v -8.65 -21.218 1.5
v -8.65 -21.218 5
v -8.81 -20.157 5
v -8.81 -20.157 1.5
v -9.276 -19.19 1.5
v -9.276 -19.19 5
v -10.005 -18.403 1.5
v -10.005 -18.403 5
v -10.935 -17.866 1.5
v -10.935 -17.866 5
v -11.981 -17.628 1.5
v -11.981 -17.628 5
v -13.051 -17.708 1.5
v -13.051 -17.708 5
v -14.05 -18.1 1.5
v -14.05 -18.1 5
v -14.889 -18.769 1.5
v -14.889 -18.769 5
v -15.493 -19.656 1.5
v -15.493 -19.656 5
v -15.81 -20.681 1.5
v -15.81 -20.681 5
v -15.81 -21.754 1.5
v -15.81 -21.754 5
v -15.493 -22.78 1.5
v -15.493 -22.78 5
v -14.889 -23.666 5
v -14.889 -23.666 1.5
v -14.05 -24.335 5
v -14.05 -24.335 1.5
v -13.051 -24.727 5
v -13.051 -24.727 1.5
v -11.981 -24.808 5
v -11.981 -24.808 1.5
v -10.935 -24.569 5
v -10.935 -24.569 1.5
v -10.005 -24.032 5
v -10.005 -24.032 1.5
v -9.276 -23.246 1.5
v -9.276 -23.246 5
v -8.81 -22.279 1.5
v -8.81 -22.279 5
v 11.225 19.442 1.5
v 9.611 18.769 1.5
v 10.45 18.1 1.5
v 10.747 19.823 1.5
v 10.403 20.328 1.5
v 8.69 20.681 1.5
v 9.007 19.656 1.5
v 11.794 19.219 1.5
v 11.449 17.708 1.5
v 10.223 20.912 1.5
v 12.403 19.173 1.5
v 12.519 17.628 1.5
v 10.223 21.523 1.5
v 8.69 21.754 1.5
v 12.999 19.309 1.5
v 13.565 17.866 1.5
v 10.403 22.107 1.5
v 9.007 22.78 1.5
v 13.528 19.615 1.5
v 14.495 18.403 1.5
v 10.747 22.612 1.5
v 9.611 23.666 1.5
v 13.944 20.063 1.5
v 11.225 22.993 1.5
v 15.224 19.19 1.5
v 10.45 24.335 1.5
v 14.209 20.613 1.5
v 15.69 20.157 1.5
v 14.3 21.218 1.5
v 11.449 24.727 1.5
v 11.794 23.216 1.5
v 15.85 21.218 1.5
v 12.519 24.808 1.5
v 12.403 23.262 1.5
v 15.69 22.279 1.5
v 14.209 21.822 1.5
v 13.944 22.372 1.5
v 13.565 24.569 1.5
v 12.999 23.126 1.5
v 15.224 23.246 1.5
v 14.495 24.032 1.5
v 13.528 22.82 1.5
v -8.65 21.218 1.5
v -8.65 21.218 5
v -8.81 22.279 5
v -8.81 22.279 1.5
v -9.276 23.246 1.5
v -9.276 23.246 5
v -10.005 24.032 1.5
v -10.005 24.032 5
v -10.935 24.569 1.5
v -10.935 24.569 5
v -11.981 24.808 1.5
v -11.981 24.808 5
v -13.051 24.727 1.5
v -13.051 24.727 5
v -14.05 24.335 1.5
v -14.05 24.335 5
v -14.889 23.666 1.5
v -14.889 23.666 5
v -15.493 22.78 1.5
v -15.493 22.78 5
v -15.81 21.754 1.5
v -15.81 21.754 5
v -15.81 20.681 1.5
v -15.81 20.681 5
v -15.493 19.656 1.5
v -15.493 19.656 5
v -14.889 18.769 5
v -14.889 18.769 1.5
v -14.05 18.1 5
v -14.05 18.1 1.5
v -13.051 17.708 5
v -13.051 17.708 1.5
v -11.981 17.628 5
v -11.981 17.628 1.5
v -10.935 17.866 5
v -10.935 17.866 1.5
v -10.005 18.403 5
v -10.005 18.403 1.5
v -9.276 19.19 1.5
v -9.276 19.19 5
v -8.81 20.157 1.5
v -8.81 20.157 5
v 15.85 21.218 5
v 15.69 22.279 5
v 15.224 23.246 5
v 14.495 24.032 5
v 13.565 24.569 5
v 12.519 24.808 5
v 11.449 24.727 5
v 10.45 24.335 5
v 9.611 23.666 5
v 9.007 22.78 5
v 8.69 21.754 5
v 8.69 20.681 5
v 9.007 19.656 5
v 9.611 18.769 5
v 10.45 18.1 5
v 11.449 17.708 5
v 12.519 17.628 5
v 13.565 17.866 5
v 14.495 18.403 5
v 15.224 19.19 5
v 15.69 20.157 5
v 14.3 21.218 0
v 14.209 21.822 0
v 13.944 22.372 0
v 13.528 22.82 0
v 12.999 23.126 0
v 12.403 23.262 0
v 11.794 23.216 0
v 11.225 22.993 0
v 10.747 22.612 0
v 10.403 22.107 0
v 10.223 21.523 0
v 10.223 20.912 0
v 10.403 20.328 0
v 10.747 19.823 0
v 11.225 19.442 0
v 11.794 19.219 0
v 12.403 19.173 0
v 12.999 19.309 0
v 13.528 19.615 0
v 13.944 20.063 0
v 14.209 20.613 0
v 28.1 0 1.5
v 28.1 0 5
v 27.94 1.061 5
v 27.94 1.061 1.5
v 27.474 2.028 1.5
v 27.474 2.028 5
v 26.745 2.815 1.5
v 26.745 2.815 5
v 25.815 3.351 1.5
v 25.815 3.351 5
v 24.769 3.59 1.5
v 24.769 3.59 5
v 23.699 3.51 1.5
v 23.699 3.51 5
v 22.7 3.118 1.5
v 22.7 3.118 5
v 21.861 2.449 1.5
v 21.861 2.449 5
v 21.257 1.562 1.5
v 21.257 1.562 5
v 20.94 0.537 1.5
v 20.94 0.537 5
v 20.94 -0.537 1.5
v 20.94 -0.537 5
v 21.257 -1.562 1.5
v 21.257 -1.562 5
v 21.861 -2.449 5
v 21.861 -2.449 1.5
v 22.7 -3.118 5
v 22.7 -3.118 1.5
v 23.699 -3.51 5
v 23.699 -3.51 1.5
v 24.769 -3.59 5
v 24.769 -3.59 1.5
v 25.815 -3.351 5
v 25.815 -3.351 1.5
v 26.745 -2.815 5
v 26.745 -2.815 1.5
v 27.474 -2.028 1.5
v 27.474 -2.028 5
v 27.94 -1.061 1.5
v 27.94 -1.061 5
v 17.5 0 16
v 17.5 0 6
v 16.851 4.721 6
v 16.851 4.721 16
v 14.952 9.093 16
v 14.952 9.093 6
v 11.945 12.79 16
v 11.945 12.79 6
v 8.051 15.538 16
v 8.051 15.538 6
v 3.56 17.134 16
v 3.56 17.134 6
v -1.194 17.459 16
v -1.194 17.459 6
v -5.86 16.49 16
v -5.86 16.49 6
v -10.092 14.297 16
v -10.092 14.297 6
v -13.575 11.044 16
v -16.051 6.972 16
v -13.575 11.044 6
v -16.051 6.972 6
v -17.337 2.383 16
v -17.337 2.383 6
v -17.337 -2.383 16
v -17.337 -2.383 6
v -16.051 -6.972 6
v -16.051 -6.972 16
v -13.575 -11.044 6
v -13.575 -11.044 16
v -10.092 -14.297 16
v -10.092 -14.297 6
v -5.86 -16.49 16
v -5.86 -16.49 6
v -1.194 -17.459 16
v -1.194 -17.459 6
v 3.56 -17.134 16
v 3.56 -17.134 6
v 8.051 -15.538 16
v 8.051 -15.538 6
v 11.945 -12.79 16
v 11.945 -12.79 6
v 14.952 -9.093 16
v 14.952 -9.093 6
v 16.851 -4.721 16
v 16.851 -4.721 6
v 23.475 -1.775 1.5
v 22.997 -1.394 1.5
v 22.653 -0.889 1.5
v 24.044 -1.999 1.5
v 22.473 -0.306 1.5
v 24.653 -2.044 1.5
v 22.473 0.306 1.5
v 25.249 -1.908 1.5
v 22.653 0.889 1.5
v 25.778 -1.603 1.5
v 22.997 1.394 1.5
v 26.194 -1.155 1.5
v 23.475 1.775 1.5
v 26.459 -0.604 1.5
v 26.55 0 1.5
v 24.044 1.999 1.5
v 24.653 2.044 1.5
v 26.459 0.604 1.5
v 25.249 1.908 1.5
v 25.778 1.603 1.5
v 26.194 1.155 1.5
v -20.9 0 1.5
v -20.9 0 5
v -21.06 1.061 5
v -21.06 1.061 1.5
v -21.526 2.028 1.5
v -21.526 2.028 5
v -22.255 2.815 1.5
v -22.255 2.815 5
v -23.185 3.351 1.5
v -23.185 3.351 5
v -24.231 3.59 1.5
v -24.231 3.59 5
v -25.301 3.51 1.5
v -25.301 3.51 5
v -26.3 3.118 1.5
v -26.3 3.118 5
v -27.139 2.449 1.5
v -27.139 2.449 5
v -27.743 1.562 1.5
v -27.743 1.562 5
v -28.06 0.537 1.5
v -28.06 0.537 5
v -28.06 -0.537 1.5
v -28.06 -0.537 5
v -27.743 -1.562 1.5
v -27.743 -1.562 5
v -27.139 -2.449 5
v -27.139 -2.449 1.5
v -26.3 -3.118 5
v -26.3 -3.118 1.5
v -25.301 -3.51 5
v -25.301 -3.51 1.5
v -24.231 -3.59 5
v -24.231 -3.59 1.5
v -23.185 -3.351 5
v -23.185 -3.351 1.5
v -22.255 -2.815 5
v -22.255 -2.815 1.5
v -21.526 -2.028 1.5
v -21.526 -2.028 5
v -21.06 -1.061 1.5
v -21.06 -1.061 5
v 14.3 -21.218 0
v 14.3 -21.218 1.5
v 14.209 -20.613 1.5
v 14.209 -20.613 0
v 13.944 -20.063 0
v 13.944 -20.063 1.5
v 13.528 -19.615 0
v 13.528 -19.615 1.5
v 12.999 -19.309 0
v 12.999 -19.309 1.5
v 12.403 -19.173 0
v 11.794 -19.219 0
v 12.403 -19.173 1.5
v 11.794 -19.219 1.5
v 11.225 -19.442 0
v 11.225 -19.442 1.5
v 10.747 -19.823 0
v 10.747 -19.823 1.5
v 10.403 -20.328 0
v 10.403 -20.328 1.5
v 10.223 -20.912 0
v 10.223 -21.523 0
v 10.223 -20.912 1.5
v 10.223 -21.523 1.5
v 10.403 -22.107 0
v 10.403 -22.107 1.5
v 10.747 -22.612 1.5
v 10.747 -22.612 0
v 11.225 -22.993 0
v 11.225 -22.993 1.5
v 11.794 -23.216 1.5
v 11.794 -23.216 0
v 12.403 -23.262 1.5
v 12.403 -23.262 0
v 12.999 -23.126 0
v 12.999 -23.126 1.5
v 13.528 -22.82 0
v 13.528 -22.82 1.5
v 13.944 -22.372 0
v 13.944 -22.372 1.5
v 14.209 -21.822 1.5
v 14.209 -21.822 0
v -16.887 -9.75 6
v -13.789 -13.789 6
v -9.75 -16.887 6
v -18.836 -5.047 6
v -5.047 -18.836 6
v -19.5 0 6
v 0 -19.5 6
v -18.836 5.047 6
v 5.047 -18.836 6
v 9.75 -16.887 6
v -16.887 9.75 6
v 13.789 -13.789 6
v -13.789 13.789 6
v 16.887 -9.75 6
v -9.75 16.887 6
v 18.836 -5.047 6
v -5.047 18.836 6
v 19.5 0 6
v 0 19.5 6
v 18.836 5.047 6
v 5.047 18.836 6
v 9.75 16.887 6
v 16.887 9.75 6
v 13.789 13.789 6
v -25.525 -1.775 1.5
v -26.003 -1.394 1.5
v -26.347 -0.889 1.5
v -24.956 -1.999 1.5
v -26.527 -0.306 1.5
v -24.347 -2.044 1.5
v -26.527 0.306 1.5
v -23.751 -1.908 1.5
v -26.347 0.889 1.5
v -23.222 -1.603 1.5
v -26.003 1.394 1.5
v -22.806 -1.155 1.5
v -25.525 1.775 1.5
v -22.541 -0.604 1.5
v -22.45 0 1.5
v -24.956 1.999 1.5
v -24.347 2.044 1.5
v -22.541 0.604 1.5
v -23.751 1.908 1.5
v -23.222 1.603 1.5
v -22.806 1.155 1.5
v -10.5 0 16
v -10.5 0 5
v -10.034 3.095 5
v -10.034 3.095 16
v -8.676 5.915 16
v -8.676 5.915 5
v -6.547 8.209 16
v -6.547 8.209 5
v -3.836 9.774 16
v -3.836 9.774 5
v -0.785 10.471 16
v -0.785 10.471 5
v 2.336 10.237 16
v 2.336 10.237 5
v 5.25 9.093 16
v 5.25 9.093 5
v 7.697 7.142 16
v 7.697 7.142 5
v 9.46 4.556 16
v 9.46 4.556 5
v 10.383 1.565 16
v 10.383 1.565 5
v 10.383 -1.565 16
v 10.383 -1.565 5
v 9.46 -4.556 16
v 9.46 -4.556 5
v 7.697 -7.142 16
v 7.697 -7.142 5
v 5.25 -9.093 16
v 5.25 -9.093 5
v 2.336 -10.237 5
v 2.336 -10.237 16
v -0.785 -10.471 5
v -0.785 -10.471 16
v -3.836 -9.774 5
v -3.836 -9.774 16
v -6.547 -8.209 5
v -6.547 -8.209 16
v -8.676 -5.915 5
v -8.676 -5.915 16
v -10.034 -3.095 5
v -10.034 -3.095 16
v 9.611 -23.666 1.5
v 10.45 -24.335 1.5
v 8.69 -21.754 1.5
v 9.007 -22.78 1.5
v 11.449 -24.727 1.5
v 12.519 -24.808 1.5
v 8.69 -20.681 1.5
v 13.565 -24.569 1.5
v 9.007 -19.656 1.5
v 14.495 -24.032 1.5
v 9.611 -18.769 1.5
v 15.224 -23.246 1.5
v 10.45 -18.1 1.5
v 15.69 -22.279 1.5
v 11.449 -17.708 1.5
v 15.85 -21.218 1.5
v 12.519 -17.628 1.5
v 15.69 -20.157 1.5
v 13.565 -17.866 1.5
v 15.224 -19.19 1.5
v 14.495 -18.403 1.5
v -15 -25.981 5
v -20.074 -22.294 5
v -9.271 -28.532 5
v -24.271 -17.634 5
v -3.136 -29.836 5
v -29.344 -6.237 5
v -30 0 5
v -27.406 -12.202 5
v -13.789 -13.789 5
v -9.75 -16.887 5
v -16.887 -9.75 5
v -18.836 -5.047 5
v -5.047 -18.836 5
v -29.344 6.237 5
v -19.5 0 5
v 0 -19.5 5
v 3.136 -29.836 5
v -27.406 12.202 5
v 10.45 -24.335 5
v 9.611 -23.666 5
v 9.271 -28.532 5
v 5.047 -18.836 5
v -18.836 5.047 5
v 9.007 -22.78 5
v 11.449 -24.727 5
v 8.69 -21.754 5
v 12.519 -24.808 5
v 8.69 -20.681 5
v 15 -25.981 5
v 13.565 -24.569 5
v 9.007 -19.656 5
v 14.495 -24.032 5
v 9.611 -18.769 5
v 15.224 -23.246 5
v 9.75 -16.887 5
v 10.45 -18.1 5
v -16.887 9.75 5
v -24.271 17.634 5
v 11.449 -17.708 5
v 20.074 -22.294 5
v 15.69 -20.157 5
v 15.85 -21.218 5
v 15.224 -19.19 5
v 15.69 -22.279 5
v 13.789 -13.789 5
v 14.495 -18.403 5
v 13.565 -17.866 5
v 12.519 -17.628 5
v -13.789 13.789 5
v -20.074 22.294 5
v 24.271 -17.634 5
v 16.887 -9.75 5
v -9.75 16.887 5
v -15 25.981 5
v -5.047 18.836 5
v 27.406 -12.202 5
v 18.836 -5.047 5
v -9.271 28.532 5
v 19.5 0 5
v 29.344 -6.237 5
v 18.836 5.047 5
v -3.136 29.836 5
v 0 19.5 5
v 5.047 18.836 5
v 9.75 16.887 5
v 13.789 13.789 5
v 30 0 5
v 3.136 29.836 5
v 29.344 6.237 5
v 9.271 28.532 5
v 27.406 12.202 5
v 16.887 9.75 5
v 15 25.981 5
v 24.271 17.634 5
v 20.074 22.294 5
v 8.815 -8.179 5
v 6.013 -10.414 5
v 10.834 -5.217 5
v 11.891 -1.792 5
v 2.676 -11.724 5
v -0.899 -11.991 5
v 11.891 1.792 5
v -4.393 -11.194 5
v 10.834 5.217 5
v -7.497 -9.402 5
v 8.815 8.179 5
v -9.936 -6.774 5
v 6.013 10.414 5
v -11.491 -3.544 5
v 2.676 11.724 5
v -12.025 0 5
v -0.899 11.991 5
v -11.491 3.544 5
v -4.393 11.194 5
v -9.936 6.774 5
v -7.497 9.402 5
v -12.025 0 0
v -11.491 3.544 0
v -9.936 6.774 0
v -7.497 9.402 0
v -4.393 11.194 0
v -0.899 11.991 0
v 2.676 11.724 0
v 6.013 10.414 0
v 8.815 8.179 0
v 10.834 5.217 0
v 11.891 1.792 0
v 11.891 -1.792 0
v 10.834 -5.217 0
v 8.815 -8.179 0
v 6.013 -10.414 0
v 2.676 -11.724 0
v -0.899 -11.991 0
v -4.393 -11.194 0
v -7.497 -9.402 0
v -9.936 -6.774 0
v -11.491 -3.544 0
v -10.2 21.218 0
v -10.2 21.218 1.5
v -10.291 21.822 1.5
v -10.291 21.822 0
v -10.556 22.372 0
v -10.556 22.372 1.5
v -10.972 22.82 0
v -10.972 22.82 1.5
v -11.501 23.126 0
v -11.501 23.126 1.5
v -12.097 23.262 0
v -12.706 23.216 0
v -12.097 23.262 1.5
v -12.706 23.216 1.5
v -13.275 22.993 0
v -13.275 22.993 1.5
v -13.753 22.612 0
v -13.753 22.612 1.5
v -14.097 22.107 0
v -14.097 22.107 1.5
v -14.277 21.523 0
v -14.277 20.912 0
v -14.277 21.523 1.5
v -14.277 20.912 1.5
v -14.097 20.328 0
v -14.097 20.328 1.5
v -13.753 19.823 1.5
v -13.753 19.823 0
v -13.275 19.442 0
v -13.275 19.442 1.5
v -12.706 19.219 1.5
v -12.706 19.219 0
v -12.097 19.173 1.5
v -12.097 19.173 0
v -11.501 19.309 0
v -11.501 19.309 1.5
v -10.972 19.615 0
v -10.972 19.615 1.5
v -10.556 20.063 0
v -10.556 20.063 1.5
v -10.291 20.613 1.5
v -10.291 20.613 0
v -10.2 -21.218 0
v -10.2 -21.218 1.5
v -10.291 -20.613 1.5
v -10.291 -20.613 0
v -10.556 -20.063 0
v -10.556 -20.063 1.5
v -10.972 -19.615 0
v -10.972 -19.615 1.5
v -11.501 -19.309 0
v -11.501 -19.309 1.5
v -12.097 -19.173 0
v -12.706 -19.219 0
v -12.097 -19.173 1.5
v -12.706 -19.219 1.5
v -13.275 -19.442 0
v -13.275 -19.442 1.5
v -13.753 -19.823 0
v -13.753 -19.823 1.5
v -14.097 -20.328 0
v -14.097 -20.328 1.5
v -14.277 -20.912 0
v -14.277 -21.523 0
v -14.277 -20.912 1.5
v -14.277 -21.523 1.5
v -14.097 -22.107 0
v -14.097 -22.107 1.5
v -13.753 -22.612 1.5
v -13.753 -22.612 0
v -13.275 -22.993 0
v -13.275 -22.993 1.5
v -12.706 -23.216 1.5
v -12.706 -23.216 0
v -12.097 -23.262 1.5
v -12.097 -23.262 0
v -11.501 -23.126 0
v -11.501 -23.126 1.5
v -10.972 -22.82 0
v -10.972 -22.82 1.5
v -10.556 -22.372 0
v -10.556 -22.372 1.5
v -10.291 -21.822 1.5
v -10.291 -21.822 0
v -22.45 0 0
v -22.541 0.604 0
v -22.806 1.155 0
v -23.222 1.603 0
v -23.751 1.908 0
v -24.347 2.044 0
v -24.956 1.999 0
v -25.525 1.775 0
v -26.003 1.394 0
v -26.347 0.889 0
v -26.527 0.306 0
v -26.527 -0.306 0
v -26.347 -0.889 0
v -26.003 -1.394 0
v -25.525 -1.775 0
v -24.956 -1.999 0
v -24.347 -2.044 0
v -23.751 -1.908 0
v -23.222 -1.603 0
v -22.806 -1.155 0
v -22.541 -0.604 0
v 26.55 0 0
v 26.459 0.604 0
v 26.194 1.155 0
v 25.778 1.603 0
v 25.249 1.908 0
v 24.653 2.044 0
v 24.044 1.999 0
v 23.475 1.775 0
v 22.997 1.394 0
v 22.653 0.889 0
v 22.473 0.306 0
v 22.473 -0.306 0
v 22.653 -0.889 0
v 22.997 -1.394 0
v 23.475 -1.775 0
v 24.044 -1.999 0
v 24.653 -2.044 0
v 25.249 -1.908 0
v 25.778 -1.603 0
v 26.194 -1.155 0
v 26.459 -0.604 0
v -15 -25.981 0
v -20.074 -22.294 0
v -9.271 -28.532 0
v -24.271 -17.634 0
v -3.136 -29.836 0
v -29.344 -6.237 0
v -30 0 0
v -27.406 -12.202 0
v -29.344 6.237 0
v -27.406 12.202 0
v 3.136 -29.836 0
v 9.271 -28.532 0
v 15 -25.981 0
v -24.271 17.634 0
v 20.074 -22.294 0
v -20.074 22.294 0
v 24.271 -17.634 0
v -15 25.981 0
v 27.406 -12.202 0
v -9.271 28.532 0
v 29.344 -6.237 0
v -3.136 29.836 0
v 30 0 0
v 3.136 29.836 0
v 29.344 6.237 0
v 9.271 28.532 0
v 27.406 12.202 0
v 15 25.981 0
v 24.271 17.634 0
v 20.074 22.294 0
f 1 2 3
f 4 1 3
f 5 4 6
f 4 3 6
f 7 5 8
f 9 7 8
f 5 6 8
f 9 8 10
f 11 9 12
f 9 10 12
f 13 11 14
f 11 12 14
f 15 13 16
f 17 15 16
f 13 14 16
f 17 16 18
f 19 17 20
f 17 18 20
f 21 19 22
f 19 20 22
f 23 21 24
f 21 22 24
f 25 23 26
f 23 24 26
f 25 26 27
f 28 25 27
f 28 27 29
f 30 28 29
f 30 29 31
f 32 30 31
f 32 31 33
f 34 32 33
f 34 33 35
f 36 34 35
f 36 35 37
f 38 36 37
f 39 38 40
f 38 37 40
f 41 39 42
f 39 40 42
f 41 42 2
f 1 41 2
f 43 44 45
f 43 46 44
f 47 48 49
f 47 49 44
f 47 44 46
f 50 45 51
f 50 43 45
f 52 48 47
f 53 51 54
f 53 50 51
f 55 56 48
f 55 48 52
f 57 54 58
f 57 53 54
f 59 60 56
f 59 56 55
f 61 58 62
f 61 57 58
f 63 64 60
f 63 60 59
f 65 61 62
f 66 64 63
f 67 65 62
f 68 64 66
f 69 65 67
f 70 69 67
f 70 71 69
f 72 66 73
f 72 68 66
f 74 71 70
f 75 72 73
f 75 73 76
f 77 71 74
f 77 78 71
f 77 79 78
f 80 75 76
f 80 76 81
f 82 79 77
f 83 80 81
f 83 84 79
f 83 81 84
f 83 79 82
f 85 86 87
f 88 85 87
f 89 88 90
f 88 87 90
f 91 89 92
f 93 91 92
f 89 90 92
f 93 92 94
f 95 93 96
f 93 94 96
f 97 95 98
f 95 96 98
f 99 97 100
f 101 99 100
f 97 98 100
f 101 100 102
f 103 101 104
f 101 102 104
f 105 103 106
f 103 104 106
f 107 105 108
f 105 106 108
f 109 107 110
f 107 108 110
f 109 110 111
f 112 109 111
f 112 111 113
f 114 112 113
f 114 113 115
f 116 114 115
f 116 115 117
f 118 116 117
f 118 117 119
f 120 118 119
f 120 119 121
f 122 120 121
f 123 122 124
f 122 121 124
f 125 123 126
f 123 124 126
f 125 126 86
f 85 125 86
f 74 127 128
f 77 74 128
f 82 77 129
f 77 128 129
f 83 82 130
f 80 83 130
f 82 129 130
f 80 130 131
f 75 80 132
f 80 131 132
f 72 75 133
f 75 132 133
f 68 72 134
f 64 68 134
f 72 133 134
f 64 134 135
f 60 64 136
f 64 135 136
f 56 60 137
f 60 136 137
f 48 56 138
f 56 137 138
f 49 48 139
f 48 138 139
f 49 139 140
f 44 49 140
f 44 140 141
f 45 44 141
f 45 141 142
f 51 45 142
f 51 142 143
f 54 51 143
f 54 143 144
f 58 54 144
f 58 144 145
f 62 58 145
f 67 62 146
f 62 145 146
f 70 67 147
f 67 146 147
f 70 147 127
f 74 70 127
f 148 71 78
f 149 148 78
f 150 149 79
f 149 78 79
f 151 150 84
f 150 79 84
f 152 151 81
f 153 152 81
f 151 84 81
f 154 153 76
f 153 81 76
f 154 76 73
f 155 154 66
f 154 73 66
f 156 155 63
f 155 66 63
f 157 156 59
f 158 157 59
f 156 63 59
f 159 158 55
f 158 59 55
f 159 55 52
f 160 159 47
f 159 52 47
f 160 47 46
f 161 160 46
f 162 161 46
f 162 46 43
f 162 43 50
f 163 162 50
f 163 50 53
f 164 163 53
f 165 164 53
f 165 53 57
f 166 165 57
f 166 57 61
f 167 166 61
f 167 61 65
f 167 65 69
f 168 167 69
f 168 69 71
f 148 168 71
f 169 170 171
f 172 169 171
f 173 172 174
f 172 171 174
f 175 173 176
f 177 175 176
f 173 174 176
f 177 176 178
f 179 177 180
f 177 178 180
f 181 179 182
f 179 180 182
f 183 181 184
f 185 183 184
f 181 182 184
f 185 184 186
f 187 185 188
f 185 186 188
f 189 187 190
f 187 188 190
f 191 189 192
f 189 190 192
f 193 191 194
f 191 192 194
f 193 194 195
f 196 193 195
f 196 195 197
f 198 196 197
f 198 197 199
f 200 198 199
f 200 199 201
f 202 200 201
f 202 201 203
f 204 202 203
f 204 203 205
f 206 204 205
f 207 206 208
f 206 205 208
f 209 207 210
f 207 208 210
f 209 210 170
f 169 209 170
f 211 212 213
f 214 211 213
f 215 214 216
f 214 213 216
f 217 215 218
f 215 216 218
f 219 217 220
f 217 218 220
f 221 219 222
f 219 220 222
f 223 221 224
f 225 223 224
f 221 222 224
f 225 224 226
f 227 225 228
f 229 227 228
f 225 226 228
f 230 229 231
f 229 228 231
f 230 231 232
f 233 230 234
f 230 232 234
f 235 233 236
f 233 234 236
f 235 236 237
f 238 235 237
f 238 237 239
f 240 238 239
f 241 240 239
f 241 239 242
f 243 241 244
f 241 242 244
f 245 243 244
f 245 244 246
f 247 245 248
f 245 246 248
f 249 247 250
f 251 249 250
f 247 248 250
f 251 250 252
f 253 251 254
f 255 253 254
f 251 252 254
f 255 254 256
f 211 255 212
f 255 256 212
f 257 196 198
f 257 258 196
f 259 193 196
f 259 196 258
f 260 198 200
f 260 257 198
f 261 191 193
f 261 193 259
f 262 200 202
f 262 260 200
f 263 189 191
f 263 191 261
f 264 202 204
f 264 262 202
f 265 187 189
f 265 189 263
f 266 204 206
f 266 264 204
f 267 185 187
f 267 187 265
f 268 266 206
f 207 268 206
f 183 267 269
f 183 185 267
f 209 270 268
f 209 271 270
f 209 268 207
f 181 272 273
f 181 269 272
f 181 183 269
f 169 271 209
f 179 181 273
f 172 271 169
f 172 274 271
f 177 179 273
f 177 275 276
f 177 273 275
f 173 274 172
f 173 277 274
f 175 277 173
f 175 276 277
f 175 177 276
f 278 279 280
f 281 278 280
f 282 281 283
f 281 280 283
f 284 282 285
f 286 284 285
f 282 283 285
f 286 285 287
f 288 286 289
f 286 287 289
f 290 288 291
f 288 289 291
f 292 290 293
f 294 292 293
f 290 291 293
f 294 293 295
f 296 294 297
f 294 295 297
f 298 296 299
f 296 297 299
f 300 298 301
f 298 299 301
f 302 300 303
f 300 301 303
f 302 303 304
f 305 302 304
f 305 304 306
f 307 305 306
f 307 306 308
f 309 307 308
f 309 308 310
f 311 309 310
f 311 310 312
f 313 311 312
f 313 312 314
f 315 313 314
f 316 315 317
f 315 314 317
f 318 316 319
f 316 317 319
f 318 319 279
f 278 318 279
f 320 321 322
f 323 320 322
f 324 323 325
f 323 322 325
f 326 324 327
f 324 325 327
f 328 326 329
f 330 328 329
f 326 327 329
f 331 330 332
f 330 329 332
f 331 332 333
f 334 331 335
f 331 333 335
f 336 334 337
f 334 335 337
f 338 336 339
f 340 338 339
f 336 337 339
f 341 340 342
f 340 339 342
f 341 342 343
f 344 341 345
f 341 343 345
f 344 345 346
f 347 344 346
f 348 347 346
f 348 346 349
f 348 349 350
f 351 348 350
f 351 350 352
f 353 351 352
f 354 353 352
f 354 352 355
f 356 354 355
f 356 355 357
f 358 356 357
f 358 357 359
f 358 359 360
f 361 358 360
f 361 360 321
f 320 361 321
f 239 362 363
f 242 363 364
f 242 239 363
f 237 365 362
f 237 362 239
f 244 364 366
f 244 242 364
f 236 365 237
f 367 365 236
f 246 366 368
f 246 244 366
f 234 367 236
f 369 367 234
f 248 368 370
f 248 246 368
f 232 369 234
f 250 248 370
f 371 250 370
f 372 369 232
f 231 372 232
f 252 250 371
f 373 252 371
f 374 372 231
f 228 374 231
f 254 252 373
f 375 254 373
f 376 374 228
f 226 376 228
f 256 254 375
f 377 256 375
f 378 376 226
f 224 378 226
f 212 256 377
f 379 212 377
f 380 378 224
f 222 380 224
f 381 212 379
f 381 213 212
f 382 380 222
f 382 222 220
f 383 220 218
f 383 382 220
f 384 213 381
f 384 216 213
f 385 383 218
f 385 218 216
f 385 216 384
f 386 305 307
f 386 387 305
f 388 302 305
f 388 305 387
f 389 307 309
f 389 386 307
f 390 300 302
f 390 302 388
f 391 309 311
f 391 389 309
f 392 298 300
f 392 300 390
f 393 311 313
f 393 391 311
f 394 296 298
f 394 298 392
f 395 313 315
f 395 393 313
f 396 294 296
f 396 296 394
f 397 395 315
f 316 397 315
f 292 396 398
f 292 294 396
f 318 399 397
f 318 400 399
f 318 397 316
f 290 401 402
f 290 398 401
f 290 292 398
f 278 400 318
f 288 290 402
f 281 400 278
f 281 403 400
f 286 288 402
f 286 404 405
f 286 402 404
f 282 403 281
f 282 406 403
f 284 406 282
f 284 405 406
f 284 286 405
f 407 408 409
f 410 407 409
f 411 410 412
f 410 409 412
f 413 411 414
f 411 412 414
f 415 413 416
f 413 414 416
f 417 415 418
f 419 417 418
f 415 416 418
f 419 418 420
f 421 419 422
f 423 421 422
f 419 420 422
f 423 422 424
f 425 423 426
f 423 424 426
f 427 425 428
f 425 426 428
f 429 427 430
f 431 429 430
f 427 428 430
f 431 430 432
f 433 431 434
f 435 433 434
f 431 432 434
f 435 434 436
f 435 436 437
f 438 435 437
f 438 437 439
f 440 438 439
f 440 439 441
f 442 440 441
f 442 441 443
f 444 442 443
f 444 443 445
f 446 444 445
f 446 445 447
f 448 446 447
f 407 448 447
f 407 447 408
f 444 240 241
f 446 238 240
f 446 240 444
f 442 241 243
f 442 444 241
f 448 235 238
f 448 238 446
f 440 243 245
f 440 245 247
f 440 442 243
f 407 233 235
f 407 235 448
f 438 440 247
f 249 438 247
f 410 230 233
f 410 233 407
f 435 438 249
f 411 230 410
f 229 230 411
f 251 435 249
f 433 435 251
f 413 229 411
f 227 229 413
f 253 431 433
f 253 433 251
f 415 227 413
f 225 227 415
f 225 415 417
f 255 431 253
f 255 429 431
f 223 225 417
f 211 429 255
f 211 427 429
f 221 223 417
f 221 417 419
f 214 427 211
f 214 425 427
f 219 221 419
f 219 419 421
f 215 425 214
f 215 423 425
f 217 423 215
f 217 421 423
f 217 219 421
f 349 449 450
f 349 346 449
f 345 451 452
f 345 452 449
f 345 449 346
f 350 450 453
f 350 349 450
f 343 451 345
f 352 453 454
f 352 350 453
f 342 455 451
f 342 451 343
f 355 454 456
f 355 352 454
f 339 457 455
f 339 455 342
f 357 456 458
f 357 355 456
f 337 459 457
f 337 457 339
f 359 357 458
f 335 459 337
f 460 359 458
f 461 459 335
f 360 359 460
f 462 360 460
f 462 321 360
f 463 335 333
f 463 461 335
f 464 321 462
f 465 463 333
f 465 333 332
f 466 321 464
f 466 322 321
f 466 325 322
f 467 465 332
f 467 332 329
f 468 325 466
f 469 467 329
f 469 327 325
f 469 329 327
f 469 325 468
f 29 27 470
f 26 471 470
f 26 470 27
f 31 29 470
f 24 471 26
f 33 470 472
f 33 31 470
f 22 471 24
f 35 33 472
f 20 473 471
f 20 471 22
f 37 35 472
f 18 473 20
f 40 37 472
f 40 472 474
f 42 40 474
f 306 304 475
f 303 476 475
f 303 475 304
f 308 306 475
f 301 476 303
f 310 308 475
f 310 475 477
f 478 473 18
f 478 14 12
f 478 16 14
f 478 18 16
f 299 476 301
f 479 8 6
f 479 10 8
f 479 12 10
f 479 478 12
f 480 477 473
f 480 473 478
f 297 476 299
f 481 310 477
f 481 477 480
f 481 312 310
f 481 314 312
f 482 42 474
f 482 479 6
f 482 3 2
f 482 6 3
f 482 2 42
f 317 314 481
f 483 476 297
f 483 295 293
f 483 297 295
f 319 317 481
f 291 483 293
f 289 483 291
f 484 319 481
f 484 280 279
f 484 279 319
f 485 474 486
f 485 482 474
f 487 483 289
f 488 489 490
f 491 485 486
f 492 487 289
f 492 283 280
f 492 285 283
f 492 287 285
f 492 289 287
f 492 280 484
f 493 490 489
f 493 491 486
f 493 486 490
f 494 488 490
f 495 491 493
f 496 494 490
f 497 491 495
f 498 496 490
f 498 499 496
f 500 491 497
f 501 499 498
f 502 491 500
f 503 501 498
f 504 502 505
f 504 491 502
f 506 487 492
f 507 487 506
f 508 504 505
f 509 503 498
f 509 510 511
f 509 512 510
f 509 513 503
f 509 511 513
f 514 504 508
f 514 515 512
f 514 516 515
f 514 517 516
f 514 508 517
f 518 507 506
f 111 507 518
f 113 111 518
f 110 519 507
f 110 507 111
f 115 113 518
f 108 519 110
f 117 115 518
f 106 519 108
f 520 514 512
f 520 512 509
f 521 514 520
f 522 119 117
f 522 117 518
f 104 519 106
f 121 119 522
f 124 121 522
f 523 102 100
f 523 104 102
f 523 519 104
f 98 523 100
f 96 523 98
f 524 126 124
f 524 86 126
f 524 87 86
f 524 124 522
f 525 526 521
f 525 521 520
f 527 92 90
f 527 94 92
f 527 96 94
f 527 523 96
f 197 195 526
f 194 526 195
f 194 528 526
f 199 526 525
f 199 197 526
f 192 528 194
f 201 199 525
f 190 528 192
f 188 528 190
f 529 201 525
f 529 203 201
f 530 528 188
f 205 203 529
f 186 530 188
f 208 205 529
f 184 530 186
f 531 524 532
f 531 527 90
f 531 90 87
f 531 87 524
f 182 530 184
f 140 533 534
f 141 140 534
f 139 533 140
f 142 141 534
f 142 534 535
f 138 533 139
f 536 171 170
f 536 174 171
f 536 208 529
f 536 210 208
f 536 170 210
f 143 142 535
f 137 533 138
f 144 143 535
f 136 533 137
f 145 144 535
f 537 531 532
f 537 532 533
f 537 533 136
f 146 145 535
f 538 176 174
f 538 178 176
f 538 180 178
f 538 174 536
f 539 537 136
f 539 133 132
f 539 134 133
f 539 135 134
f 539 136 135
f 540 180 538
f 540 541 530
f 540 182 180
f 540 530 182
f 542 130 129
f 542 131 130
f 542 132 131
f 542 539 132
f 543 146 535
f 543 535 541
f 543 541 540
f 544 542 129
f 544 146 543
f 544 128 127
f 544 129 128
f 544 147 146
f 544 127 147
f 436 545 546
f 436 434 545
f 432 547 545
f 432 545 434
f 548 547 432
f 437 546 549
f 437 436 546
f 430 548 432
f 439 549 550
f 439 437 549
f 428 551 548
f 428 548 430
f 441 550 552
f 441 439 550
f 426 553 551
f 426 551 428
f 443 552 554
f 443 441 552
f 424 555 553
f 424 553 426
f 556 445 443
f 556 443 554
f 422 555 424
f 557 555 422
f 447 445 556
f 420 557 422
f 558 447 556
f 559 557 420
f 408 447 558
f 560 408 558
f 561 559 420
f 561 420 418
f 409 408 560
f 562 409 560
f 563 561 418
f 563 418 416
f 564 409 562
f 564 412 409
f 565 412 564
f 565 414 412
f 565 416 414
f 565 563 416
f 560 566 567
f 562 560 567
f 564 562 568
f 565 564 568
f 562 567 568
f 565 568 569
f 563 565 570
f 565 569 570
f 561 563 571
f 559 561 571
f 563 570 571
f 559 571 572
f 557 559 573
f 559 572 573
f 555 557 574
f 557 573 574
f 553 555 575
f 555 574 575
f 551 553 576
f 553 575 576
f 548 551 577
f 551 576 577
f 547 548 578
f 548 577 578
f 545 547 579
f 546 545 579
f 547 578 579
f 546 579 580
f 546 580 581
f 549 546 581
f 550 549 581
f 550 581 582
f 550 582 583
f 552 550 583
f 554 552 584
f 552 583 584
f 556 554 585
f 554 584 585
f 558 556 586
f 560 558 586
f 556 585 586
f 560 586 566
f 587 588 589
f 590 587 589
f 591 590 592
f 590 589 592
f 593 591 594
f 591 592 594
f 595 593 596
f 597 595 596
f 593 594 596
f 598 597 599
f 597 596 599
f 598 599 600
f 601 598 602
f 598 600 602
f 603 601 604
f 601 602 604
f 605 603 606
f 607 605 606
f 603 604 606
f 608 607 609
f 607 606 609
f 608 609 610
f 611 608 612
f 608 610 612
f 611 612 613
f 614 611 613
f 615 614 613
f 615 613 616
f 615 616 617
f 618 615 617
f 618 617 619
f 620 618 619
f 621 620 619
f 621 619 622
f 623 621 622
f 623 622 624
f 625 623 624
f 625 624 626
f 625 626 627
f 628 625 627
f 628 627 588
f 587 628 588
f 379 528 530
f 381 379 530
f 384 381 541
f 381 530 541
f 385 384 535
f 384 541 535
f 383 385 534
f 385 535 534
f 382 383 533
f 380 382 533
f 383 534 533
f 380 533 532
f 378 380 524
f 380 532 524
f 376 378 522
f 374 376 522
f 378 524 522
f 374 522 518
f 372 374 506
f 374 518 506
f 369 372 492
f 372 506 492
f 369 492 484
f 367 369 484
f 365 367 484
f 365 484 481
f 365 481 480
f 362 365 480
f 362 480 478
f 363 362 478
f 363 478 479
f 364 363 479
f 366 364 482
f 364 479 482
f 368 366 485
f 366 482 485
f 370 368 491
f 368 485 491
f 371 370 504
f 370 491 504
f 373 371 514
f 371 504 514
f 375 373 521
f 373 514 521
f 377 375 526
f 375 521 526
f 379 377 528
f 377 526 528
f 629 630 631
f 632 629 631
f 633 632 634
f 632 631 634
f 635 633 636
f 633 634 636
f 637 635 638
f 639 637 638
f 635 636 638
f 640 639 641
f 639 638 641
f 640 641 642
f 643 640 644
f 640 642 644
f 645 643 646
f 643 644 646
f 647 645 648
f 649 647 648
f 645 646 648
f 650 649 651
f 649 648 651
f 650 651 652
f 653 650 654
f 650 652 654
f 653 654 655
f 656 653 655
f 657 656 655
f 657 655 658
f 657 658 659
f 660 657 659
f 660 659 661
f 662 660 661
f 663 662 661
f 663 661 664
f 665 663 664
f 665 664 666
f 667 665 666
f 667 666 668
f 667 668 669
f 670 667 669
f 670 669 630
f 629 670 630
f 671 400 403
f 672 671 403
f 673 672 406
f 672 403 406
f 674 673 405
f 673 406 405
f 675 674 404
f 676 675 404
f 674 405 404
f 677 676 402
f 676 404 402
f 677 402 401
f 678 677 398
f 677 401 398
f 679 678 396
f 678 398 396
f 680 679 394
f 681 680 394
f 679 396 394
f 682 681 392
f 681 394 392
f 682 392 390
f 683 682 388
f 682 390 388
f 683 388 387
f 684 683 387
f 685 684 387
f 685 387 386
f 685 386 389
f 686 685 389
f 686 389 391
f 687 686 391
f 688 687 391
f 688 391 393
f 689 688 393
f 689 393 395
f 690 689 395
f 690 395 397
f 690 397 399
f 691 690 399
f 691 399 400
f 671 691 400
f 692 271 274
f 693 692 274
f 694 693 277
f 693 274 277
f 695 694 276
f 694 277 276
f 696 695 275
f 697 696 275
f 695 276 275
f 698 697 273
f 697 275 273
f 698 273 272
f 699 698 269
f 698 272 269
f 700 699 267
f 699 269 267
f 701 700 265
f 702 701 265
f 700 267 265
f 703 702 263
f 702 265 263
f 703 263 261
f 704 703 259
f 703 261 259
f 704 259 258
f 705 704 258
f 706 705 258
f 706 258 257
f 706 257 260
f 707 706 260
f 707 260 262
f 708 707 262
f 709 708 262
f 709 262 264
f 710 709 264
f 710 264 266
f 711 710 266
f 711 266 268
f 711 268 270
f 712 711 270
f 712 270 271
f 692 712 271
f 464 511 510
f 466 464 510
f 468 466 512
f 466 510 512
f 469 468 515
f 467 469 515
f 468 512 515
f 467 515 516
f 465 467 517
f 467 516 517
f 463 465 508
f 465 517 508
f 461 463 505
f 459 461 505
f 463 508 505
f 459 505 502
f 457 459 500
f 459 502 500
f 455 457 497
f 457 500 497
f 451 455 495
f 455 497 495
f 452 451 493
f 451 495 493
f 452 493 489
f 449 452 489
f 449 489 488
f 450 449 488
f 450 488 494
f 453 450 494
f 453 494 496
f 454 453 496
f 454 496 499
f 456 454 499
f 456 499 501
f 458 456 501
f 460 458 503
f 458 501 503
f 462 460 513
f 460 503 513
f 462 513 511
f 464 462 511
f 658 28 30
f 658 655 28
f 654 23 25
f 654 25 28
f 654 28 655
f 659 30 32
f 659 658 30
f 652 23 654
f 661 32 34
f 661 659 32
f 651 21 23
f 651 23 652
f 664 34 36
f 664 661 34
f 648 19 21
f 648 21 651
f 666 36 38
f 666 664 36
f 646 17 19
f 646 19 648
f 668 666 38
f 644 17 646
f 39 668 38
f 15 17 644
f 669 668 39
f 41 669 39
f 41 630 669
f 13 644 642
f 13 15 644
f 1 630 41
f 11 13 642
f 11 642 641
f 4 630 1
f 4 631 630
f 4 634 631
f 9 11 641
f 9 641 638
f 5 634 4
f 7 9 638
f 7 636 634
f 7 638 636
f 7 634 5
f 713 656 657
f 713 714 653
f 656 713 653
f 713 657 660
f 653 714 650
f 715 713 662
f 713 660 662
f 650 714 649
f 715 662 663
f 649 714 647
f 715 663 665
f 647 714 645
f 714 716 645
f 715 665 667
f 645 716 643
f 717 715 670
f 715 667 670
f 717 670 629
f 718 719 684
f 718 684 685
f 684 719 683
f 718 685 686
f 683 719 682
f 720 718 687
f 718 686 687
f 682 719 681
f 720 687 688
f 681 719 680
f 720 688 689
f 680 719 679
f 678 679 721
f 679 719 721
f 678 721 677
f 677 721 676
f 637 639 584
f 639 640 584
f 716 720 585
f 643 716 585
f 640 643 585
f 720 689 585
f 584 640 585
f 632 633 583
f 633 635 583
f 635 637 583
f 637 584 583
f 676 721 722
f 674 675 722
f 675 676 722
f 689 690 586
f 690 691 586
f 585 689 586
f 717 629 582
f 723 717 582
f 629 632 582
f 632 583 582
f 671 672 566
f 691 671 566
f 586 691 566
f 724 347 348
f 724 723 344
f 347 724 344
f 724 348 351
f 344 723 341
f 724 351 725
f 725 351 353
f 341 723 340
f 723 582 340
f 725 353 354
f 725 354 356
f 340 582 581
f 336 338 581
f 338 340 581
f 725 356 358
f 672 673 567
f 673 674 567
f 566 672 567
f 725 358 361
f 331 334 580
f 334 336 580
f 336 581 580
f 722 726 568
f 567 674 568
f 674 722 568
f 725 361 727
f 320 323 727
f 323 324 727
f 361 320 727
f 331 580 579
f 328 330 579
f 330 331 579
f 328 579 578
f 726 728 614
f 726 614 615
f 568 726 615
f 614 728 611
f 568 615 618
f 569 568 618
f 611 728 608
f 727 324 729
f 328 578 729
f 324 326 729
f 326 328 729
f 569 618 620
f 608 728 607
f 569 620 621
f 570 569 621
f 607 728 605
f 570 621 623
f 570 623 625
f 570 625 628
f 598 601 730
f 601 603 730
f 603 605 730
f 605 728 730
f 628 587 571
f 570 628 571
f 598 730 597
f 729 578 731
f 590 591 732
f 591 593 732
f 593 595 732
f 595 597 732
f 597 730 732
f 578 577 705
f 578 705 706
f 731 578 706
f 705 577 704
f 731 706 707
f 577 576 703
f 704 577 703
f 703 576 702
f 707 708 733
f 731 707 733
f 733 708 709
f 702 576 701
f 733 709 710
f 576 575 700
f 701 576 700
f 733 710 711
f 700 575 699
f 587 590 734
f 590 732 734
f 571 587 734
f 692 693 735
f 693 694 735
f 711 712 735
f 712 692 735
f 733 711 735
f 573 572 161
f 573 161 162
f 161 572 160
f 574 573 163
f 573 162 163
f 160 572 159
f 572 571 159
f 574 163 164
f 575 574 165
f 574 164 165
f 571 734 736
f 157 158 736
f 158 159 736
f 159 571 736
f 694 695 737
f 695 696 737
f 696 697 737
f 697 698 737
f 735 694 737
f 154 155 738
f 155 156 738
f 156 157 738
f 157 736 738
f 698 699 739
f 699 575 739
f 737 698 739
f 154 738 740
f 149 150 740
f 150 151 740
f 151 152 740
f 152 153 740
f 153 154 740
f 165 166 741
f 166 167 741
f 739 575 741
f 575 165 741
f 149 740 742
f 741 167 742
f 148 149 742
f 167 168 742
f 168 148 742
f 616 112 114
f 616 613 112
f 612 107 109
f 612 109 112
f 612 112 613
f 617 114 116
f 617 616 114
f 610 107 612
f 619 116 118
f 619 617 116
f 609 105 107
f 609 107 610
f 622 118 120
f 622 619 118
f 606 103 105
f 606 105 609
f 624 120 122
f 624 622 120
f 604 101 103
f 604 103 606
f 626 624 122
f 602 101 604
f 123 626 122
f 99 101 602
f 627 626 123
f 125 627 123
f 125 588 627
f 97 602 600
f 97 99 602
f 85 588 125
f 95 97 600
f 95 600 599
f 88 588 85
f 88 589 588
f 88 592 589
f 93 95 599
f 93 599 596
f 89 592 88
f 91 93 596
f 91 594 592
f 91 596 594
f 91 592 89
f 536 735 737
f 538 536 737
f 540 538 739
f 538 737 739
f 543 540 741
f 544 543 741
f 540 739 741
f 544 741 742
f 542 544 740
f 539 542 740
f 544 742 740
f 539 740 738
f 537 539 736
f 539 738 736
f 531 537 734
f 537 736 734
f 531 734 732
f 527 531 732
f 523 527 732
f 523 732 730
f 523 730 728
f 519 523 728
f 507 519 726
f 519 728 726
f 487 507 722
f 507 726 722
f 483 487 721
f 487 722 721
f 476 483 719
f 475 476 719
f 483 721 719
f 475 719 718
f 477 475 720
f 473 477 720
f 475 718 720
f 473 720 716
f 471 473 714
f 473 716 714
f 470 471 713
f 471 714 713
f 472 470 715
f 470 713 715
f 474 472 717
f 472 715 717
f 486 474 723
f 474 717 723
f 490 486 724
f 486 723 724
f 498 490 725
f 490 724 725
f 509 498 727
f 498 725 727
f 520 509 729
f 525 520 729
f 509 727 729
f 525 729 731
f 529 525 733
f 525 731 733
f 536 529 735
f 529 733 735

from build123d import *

# Parameters (mm, degrees)
SKETCH1_R           = 30
BOSS_EXTRUDE1_DEPTH = 5
SKETCH2_R           = 19.5
BOSS_EXTRUDE2_DEPTH = 1
SKETCH3_R           = 17.5
BOSS_EXTRUDE3_DEPTH = 10
SKETCH5_R           = 2.05
CUT_EXTRUDE1_DEPTH  = 44.829214002
SKETCH6_R           = 3.6
CUT_EXTRUDE2_DEPTH  = 3.5
SKETCH9_R           = 5.5
CUT_EXTRUDE5_DEPTH  = 4
SKETCH7_R           = 12.025
CUT_EXTRUDE3_DEPTH  = 5
SKETCH8_R           = 10.5
CUT_EXTRUDE4_DEPTH  = 44.829214002


with BuildPart() as part:
    # Sketch1 → Boss-Extrude1 (new body)
    with BuildSketch(Plane.XY):
        Circle(SKETCH1_R)
    extrude(amount=BOSS_EXTRUDE1_DEPTH)

    # Sketch2 → Boss-Extrude2 (add)
    with BuildSketch(Plane.XY.offset(5)):
        Circle(SKETCH2_R)
    extrude(amount=BOSS_EXTRUDE2_DEPTH)

    # Sketch3 → Boss-Extrude3 (add)
    with BuildSketch(Plane.XY.offset(6)):
        Circle(SKETCH3_R)
    extrude(amount=BOSS_EXTRUDE3_DEPTH)

    # Sketch5 → Cut-Extrude1 (cut, through all)
    with BuildSketch(Plane.XY.offset(5)):
        with Locations((24.5, 0)):
            Circle(SKETCH5_R)
        with Locations((12.25, -21.217622393)):
            Circle(SKETCH5_R)
        with Locations((-12.25, -21.217622393)):
            Circle(SKETCH5_R)
        with Locations((-24.5, 0)):
            Circle(SKETCH5_R)
        with Locations((-12.25, 21.217622393)):
            Circle(SKETCH5_R)
        with Locations((12.25, 21.217622393)):
            Circle(SKETCH5_R)
    extrude(amount=-CUT_EXTRUDE1_DEPTH, mode=Mode.SUBTRACT)

    # Sketch6 → Cut-Extrude2 (cut)
    with BuildSketch(Plane.XY.offset(5)):
        with Locations((24.5, 0)):
            Circle(SKETCH6_R)
        with Locations((12.25, -21.217622393)):
            Circle(SKETCH6_R)
        with Locations((-12.25, -21.217622393)):
            Circle(SKETCH6_R)
        with Locations((-24.5, 0)):
            Circle(SKETCH6_R)
        with Locations((-12.25, 21.217622393)):
            Circle(SKETCH6_R)
        with Locations((12.25, 21.217622393)):
            Circle(SKETCH6_R)
    extrude(amount=-CUT_EXTRUDE2_DEPTH, mode=Mode.SUBTRACT)

    # Sketch9 → Cut-Extrude5 (cut)
    with BuildSketch(Plane(origin=(0, 0, 0), x_dir=(-1, 0, 0), z_dir=(0, 0, -1))):
        Circle(SKETCH9_R)
    extrude(amount=-CUT_EXTRUDE5_DEPTH, mode=Mode.SUBTRACT)

    # Sketch7 → Cut-Extrude3 (cut)
    with BuildSketch(Plane(origin=(0, 0, 0), x_dir=(-1, 0, 0), z_dir=(0, 0, -1))):
        Circle(SKETCH7_R)
    extrude(amount=-CUT_EXTRUDE3_DEPTH, mode=Mode.SUBTRACT)

    # Sketch8 → Cut-Extrude4 (cut, through all)
    with BuildSketch(Plane(origin=(0, 0, 5), x_dir=(-1, 0, 0), z_dir=(0, 0, -1))):
        Circle(SKETCH8_R)
    extrude(amount=-CUT_EXTRUDE4_DEPTH, mode=Mode.SUBTRACT)


solid = part.part
